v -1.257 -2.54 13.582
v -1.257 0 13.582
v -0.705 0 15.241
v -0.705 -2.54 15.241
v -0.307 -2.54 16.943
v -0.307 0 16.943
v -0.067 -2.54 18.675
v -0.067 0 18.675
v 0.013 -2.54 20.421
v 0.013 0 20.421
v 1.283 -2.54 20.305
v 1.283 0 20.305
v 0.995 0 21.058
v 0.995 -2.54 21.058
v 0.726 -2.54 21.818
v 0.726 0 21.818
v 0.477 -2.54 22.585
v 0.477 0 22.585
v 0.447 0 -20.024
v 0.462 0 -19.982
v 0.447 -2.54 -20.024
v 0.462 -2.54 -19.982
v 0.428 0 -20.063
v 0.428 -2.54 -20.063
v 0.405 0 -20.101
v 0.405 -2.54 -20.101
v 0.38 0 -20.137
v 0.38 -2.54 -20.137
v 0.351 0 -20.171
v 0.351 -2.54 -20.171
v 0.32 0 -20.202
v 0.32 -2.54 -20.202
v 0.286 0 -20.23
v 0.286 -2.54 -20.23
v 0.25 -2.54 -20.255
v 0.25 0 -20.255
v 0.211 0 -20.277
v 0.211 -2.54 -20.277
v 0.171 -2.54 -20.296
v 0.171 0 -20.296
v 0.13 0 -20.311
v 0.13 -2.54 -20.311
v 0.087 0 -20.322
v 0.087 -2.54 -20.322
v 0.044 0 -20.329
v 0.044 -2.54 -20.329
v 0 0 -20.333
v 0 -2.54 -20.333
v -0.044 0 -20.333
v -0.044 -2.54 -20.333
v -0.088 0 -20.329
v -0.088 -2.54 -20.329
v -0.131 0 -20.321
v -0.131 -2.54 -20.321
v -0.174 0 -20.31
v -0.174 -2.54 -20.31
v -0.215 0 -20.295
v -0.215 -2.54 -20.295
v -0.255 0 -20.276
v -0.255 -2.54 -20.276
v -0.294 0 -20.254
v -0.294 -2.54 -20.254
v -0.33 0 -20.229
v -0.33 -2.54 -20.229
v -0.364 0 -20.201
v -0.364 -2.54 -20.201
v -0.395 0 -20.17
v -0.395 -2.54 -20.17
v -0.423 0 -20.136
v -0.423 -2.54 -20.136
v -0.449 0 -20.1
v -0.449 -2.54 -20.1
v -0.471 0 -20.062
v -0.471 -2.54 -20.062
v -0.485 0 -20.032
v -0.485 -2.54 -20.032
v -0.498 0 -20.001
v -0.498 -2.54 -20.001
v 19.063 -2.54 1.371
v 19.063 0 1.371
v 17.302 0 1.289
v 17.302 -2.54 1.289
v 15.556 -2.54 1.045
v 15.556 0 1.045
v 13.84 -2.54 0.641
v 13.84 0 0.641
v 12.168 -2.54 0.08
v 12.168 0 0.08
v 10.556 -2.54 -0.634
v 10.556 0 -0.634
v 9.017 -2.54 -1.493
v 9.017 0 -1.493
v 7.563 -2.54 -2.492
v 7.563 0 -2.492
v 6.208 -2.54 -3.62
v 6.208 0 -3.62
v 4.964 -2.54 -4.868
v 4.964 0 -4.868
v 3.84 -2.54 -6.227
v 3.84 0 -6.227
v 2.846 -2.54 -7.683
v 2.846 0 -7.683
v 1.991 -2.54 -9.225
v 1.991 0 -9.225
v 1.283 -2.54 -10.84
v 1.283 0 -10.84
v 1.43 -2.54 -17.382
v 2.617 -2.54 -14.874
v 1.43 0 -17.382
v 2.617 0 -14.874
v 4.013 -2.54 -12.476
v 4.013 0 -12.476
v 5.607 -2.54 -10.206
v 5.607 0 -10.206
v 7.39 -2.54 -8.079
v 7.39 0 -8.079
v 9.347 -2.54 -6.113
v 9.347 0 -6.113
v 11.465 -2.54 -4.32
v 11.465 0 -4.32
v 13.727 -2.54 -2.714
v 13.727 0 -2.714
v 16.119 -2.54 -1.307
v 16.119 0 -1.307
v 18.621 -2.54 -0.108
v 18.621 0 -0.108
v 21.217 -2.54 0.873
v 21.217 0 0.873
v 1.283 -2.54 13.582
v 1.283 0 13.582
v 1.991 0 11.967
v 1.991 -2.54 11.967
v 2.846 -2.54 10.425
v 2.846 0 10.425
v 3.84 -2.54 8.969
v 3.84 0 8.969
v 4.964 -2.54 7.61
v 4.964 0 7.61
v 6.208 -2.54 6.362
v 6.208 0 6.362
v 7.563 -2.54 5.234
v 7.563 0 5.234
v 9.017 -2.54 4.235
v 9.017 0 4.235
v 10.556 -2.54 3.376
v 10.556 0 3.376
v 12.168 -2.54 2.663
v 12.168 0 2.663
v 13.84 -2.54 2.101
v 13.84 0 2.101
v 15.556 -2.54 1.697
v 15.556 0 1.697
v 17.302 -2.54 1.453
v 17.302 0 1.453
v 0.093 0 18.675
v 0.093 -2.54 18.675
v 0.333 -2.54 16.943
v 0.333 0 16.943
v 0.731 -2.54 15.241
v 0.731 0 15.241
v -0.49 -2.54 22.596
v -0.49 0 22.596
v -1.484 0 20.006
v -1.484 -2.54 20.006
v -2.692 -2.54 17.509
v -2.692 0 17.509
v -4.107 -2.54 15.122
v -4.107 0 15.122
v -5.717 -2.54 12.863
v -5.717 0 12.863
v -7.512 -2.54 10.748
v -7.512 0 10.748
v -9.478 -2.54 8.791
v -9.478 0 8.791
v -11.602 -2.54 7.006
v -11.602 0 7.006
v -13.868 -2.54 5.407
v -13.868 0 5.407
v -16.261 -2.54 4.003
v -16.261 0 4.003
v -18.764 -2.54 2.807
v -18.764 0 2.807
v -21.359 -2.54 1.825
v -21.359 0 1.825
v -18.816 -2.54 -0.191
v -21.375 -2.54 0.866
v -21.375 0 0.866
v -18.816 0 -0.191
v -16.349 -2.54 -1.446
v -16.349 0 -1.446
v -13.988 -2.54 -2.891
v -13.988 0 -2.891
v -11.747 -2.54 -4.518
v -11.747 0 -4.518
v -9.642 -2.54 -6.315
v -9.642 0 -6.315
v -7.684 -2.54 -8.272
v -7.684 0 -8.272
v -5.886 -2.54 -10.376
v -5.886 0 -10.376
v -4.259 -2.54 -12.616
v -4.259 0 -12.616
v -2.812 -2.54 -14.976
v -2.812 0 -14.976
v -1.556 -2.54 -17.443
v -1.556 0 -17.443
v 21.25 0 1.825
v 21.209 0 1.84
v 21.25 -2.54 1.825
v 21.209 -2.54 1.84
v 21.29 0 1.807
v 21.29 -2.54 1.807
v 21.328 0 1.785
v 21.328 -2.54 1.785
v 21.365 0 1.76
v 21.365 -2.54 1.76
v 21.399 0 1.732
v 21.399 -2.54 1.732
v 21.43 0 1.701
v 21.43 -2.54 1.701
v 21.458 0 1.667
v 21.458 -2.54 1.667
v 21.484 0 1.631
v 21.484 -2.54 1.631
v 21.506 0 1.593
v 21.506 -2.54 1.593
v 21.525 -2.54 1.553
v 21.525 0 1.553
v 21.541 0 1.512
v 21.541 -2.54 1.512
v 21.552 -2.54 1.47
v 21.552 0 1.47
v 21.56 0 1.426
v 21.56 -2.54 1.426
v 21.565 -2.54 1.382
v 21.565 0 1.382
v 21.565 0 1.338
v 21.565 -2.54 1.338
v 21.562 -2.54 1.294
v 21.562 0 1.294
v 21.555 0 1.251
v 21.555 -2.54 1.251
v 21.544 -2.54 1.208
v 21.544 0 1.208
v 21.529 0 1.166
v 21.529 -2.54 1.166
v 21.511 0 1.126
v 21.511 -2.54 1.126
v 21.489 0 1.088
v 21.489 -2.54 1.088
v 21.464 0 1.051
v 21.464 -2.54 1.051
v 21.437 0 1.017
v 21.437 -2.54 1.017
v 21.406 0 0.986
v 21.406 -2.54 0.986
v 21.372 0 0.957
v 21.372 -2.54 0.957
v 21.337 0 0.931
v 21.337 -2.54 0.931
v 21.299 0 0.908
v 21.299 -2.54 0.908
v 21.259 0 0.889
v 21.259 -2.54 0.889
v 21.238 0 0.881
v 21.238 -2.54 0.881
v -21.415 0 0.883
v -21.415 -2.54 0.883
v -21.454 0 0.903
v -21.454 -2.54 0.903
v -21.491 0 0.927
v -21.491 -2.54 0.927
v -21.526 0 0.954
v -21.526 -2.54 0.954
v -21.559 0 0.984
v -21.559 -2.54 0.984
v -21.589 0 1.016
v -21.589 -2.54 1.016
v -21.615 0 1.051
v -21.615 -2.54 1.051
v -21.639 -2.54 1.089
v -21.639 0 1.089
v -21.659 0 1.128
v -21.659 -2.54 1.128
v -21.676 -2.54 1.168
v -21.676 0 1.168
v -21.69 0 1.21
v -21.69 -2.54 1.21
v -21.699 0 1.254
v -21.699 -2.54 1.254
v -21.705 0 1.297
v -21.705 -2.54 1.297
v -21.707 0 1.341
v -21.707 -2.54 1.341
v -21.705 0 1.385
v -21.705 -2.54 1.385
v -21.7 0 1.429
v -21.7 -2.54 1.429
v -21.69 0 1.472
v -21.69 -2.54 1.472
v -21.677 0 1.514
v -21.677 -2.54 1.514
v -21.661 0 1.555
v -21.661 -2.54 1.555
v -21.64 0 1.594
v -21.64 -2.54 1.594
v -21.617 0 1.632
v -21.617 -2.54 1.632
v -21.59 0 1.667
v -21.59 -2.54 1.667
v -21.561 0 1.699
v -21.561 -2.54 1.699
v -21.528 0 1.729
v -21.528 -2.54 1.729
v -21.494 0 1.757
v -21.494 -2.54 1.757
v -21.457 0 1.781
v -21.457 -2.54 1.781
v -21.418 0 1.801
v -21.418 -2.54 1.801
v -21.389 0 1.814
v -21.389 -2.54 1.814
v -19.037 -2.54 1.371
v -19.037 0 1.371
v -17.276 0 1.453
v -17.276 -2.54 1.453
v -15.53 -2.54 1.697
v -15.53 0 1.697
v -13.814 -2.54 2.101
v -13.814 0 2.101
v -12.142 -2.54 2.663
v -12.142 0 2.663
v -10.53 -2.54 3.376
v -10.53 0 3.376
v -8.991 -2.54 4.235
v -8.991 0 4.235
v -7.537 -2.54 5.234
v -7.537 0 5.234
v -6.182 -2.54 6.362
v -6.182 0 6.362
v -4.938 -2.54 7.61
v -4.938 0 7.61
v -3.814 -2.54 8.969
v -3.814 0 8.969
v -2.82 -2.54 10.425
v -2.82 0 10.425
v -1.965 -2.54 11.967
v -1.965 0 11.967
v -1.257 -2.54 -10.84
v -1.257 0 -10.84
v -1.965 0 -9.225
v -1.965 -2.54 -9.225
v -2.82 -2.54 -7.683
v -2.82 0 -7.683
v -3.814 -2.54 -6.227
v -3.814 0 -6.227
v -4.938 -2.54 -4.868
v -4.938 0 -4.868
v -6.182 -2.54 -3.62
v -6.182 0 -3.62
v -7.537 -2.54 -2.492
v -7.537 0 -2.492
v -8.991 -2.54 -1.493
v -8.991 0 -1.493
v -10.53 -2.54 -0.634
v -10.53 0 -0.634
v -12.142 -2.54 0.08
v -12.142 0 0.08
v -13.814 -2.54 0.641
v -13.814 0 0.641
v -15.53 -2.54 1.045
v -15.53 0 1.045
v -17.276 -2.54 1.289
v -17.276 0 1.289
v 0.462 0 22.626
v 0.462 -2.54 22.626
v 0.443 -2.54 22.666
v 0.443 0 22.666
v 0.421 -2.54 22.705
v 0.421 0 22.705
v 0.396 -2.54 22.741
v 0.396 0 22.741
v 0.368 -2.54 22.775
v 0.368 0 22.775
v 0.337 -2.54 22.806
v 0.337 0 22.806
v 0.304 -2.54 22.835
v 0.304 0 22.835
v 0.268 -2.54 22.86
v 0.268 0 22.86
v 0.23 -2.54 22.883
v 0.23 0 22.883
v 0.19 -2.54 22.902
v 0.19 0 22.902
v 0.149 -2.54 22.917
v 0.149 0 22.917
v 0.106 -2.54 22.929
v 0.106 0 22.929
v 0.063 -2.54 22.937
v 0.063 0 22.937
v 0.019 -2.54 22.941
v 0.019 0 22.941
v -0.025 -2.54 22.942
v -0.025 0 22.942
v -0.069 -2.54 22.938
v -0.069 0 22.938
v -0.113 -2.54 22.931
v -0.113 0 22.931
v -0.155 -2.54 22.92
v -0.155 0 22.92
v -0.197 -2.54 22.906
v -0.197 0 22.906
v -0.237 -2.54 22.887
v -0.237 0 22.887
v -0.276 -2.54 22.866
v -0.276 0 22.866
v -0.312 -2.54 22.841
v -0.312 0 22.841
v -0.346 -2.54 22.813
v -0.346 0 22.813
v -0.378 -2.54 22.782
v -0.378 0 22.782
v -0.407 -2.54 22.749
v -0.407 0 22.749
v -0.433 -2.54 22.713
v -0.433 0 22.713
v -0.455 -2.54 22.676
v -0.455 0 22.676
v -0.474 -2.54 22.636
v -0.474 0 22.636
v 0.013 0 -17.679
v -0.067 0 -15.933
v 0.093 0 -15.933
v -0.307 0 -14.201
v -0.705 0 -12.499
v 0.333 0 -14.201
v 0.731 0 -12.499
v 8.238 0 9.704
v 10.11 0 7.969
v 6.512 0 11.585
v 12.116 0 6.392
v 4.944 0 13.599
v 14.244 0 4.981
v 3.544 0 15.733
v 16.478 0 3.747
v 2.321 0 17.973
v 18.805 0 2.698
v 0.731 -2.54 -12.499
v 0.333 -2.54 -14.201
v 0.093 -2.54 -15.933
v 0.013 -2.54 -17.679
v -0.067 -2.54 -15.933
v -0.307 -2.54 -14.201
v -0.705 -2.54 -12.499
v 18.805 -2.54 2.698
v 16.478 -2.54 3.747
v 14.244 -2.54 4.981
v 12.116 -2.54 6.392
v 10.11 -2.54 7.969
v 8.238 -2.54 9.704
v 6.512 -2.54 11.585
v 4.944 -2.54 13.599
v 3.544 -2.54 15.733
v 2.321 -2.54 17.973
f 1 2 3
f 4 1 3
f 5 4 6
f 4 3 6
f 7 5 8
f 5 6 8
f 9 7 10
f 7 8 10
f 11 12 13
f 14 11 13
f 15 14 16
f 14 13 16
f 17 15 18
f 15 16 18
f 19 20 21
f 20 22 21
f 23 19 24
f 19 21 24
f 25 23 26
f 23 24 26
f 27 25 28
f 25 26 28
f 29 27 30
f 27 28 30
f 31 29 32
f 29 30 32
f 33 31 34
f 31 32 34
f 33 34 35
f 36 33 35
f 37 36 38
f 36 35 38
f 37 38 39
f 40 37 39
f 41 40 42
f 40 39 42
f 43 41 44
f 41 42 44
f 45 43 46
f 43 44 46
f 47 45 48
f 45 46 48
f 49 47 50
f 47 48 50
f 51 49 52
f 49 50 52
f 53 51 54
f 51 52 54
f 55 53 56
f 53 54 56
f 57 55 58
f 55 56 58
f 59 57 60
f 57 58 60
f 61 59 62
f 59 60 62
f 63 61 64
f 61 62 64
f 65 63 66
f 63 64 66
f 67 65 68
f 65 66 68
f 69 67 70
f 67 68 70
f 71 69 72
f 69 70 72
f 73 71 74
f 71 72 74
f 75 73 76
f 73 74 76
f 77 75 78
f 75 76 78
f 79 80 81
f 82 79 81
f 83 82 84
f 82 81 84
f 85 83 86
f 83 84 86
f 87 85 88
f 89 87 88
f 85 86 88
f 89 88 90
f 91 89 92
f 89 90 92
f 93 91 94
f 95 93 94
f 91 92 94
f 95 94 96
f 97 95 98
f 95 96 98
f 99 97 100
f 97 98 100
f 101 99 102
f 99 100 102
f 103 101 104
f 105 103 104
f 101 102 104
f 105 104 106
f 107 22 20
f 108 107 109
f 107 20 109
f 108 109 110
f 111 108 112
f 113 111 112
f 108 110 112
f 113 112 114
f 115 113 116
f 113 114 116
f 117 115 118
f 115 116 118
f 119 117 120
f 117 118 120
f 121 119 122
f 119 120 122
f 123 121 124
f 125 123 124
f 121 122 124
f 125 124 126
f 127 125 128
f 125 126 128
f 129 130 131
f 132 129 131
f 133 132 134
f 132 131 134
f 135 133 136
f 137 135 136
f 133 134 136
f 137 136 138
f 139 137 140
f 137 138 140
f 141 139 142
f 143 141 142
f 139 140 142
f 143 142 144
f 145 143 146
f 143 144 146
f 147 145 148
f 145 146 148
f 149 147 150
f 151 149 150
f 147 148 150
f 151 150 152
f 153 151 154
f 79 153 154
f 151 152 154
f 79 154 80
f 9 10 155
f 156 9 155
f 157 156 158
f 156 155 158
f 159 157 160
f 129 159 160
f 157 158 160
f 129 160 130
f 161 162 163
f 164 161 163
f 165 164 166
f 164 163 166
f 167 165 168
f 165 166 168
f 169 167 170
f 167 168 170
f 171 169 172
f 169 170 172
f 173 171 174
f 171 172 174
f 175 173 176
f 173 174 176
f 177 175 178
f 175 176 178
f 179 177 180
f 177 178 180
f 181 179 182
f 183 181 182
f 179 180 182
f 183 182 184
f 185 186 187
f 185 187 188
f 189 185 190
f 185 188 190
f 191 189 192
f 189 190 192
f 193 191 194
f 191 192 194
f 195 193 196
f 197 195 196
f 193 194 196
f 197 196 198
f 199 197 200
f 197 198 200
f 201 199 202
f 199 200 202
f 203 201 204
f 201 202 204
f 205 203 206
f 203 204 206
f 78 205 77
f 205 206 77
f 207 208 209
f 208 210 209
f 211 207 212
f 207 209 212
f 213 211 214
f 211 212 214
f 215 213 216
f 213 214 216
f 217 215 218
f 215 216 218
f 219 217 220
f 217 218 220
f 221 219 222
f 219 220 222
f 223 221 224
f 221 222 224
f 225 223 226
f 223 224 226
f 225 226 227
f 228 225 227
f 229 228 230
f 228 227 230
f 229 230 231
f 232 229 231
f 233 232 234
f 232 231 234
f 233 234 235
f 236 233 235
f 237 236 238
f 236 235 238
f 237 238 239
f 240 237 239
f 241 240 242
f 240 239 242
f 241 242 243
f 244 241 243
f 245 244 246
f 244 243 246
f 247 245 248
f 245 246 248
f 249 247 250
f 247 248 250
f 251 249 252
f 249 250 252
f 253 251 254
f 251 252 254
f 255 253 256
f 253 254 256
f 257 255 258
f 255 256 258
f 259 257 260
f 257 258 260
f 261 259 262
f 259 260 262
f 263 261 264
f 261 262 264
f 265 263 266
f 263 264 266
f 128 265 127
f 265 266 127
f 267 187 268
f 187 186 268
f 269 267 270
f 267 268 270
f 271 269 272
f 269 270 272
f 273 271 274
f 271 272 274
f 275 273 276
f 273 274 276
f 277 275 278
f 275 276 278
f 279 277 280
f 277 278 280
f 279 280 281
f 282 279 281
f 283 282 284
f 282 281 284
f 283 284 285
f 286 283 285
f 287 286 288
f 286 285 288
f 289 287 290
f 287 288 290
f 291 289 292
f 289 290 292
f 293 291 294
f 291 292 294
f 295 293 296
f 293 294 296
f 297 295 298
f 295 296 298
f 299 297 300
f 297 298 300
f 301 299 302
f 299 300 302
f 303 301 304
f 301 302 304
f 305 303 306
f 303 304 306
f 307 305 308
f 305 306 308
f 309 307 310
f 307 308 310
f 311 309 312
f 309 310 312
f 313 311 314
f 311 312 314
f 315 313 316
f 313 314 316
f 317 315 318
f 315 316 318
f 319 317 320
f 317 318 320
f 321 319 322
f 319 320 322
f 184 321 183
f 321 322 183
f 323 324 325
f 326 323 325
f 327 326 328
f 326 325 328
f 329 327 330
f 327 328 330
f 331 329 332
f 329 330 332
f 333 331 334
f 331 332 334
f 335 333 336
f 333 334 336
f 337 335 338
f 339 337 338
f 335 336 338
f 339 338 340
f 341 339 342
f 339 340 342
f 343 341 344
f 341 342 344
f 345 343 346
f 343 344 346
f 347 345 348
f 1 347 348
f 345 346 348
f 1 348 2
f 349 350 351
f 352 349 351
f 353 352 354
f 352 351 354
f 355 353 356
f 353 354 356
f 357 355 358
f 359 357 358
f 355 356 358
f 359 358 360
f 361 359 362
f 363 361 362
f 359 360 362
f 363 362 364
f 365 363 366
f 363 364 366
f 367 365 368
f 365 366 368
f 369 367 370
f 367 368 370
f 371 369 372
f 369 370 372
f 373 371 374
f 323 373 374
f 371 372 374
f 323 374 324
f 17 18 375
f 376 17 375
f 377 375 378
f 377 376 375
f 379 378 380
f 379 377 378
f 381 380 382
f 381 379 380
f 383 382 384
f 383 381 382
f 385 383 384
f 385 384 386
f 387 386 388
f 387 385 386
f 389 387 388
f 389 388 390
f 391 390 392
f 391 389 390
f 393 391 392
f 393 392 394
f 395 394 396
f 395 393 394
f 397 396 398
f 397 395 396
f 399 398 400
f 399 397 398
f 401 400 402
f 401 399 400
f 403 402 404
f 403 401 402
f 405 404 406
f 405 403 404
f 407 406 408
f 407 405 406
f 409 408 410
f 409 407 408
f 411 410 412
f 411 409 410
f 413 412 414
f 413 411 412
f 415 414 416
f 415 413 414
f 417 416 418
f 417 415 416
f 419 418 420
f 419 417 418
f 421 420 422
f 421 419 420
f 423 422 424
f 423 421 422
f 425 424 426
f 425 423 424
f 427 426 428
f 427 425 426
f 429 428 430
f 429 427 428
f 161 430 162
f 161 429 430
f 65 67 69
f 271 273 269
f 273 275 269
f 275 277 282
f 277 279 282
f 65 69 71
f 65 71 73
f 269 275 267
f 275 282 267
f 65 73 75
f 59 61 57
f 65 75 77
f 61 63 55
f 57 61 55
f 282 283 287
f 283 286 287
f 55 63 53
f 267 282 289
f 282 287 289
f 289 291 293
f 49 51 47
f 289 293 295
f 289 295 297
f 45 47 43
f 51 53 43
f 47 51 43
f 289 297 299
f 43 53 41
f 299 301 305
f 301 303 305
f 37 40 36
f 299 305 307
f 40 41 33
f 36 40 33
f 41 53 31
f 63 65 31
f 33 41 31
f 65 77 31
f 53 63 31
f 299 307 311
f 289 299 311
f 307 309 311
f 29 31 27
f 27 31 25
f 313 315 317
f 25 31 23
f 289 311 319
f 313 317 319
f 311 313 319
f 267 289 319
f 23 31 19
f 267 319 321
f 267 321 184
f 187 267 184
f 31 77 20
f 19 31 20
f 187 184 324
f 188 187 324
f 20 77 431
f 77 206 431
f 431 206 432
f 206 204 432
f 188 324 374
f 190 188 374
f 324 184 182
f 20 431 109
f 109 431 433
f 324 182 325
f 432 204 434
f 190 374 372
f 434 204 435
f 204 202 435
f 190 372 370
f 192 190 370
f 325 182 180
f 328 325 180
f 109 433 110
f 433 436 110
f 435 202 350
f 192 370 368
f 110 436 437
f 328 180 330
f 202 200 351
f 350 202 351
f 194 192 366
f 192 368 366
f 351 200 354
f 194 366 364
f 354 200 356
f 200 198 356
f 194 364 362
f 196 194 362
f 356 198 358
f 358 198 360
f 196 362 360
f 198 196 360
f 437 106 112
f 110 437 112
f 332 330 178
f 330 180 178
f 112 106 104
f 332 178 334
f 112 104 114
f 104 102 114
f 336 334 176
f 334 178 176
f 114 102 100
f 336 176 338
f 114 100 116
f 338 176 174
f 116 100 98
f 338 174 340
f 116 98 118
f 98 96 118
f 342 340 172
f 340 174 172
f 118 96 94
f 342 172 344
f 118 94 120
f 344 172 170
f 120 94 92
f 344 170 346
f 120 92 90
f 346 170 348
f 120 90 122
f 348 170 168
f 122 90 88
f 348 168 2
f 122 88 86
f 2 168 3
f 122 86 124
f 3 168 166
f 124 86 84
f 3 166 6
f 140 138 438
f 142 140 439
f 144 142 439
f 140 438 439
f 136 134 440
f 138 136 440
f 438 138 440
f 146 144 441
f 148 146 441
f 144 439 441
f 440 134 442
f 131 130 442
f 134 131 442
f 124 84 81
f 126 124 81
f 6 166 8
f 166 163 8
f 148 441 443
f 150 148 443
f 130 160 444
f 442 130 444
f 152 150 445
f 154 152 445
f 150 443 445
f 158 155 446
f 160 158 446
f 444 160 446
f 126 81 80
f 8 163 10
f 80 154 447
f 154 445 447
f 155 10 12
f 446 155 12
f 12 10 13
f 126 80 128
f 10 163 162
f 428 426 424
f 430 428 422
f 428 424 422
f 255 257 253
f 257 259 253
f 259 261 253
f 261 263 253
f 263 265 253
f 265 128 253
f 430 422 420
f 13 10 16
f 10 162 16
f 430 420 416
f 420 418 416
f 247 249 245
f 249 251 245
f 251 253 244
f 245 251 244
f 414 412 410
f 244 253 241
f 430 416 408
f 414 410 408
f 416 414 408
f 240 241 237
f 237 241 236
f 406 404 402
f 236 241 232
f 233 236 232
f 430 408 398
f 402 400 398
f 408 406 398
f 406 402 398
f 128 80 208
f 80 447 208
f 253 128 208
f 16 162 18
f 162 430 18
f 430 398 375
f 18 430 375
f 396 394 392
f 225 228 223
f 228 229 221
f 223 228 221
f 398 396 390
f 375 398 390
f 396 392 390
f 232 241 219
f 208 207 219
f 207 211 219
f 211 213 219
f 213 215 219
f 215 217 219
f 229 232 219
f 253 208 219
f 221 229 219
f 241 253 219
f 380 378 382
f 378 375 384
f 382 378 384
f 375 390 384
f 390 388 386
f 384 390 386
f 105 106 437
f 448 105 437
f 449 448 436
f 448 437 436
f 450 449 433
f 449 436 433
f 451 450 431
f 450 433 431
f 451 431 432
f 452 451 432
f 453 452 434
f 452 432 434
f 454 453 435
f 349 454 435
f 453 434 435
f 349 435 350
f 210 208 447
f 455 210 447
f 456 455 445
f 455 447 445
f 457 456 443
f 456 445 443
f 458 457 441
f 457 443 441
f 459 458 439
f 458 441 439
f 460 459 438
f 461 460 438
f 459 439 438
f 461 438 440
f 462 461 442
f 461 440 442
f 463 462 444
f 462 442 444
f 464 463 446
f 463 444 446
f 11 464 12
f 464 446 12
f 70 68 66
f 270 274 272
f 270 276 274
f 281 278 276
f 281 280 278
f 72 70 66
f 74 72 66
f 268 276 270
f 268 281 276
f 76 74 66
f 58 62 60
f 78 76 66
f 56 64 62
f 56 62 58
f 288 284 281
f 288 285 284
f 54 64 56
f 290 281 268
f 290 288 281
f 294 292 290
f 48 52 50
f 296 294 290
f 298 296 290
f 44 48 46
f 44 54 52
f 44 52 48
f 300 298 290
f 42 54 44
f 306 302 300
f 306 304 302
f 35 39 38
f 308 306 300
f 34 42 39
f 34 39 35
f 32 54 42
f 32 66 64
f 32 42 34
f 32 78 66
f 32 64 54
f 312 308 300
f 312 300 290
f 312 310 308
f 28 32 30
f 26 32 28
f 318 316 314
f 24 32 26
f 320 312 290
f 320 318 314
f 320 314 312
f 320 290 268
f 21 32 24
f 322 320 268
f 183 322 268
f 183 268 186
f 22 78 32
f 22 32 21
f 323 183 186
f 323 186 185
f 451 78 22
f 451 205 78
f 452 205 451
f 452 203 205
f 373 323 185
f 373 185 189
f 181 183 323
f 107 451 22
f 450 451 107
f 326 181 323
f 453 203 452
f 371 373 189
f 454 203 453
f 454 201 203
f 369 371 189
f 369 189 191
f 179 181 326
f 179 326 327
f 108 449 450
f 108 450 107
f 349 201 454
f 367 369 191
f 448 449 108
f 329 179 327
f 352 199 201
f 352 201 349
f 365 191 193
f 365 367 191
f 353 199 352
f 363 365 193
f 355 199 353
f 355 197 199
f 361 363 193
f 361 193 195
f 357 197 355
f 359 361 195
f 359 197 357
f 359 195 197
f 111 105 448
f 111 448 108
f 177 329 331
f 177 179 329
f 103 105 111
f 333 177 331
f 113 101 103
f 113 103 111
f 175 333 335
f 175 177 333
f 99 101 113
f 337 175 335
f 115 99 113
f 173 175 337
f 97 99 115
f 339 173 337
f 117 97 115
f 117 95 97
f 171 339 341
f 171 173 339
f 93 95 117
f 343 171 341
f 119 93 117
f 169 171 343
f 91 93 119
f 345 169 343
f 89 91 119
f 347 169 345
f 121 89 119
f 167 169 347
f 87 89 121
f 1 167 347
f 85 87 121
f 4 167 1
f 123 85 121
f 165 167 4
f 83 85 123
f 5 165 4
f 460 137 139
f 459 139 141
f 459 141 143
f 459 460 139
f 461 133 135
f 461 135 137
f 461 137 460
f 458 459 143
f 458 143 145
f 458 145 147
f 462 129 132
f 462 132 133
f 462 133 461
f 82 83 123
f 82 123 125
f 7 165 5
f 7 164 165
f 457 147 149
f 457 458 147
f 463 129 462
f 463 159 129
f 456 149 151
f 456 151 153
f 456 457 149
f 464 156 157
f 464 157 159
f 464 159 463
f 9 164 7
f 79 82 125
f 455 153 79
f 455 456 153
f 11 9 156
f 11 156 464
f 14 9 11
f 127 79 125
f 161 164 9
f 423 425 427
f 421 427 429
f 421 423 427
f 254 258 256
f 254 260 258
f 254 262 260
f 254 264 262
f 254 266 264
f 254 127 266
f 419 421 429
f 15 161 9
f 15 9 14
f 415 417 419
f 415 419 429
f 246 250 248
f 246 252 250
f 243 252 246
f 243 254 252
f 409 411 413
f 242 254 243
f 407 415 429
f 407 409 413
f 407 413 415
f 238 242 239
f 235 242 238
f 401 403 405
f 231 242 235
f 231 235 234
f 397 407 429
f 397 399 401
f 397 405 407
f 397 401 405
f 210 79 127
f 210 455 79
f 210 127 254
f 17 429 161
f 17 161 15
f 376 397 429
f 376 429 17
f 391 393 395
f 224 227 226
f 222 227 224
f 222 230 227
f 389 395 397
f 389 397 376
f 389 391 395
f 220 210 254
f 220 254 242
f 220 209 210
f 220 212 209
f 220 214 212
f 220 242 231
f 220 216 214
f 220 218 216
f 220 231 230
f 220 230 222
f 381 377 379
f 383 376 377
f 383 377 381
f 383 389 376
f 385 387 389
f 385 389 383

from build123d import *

# Parameters (mm, degrees)
F1_DEPTH = 2.54
F2_R     = 0.508


with BuildPart() as f1:
    # F0 (on Front) → F1 (new body)
    with BuildSketch(Plane.XZ):
        with BuildLine():
            ThreePointArc((22.872963, 1.371057), (9.798592, 8.238838), (1.282963, 20.304891))
            ThreePointArc((1.282963, 20.304891), (0.583696, 22.247186), (0.012963, 24.231057))
            ThreePointArc((0.012963, 24.231057), (-8.419151, 9.803172), (-22.847037, 1.371057))
            ThreePointArc((-22.847037, 1.371057), (-8.637784, -7.27969), (0.012963, -21.488943))
            ThreePointArc((0.012963, -21.488943), (8.403265, -7.019245), (22.872963, 1.371057))
        make_face()
        with BuildLine():
            ThreePointArc((1.282963, -10.839783), (0.333154, -14.200904), (0.012963, -17.678943))
            ThreePointArc((0.012963, -17.678943), (-0.307228, -14.200904), (-1.257037, -10.839783))
            ThreePointArc((-1.257037, -10.839783), (-8.252406, -1.975623), (-19.037037, 1.371057))
            ThreePointArc((-19.037037, 1.371057), (-8.252406, 4.717738), (-1.257037, 13.581898))
            ThreePointArc((-1.257037, 13.581898), (-0.307228, 16.943019), (0.012963, 20.421057))
            ThreePointArc((0.012963, 20.421057), (0.333154, 16.943019), (1.282963, 13.581898))
            ThreePointArc((1.282963, 13.581898), (8.278332, 4.717738), (19.062963, 1.371057))
            ThreePointArc((19.062963, 1.371057), (8.278332, -1.975623), (1.282963, -10.839783))
        make_face(mode=Mode.SUBTRACT)
    extrude(amount=F1_DEPTH)

    # F2
    f2_edges = [f1.edges().sort_by_distance(p)[0] for p in [
        (0.012963, -1.27, 24.231057),
        (22.872963, -1.27, 1.371057),
        (0.012963, -1.27, -21.488943),
        (-22.847037, -1.27, 1.371057),
    ]]
    fillet(f2_edges, radius=F2_R)


solid = f1.part
